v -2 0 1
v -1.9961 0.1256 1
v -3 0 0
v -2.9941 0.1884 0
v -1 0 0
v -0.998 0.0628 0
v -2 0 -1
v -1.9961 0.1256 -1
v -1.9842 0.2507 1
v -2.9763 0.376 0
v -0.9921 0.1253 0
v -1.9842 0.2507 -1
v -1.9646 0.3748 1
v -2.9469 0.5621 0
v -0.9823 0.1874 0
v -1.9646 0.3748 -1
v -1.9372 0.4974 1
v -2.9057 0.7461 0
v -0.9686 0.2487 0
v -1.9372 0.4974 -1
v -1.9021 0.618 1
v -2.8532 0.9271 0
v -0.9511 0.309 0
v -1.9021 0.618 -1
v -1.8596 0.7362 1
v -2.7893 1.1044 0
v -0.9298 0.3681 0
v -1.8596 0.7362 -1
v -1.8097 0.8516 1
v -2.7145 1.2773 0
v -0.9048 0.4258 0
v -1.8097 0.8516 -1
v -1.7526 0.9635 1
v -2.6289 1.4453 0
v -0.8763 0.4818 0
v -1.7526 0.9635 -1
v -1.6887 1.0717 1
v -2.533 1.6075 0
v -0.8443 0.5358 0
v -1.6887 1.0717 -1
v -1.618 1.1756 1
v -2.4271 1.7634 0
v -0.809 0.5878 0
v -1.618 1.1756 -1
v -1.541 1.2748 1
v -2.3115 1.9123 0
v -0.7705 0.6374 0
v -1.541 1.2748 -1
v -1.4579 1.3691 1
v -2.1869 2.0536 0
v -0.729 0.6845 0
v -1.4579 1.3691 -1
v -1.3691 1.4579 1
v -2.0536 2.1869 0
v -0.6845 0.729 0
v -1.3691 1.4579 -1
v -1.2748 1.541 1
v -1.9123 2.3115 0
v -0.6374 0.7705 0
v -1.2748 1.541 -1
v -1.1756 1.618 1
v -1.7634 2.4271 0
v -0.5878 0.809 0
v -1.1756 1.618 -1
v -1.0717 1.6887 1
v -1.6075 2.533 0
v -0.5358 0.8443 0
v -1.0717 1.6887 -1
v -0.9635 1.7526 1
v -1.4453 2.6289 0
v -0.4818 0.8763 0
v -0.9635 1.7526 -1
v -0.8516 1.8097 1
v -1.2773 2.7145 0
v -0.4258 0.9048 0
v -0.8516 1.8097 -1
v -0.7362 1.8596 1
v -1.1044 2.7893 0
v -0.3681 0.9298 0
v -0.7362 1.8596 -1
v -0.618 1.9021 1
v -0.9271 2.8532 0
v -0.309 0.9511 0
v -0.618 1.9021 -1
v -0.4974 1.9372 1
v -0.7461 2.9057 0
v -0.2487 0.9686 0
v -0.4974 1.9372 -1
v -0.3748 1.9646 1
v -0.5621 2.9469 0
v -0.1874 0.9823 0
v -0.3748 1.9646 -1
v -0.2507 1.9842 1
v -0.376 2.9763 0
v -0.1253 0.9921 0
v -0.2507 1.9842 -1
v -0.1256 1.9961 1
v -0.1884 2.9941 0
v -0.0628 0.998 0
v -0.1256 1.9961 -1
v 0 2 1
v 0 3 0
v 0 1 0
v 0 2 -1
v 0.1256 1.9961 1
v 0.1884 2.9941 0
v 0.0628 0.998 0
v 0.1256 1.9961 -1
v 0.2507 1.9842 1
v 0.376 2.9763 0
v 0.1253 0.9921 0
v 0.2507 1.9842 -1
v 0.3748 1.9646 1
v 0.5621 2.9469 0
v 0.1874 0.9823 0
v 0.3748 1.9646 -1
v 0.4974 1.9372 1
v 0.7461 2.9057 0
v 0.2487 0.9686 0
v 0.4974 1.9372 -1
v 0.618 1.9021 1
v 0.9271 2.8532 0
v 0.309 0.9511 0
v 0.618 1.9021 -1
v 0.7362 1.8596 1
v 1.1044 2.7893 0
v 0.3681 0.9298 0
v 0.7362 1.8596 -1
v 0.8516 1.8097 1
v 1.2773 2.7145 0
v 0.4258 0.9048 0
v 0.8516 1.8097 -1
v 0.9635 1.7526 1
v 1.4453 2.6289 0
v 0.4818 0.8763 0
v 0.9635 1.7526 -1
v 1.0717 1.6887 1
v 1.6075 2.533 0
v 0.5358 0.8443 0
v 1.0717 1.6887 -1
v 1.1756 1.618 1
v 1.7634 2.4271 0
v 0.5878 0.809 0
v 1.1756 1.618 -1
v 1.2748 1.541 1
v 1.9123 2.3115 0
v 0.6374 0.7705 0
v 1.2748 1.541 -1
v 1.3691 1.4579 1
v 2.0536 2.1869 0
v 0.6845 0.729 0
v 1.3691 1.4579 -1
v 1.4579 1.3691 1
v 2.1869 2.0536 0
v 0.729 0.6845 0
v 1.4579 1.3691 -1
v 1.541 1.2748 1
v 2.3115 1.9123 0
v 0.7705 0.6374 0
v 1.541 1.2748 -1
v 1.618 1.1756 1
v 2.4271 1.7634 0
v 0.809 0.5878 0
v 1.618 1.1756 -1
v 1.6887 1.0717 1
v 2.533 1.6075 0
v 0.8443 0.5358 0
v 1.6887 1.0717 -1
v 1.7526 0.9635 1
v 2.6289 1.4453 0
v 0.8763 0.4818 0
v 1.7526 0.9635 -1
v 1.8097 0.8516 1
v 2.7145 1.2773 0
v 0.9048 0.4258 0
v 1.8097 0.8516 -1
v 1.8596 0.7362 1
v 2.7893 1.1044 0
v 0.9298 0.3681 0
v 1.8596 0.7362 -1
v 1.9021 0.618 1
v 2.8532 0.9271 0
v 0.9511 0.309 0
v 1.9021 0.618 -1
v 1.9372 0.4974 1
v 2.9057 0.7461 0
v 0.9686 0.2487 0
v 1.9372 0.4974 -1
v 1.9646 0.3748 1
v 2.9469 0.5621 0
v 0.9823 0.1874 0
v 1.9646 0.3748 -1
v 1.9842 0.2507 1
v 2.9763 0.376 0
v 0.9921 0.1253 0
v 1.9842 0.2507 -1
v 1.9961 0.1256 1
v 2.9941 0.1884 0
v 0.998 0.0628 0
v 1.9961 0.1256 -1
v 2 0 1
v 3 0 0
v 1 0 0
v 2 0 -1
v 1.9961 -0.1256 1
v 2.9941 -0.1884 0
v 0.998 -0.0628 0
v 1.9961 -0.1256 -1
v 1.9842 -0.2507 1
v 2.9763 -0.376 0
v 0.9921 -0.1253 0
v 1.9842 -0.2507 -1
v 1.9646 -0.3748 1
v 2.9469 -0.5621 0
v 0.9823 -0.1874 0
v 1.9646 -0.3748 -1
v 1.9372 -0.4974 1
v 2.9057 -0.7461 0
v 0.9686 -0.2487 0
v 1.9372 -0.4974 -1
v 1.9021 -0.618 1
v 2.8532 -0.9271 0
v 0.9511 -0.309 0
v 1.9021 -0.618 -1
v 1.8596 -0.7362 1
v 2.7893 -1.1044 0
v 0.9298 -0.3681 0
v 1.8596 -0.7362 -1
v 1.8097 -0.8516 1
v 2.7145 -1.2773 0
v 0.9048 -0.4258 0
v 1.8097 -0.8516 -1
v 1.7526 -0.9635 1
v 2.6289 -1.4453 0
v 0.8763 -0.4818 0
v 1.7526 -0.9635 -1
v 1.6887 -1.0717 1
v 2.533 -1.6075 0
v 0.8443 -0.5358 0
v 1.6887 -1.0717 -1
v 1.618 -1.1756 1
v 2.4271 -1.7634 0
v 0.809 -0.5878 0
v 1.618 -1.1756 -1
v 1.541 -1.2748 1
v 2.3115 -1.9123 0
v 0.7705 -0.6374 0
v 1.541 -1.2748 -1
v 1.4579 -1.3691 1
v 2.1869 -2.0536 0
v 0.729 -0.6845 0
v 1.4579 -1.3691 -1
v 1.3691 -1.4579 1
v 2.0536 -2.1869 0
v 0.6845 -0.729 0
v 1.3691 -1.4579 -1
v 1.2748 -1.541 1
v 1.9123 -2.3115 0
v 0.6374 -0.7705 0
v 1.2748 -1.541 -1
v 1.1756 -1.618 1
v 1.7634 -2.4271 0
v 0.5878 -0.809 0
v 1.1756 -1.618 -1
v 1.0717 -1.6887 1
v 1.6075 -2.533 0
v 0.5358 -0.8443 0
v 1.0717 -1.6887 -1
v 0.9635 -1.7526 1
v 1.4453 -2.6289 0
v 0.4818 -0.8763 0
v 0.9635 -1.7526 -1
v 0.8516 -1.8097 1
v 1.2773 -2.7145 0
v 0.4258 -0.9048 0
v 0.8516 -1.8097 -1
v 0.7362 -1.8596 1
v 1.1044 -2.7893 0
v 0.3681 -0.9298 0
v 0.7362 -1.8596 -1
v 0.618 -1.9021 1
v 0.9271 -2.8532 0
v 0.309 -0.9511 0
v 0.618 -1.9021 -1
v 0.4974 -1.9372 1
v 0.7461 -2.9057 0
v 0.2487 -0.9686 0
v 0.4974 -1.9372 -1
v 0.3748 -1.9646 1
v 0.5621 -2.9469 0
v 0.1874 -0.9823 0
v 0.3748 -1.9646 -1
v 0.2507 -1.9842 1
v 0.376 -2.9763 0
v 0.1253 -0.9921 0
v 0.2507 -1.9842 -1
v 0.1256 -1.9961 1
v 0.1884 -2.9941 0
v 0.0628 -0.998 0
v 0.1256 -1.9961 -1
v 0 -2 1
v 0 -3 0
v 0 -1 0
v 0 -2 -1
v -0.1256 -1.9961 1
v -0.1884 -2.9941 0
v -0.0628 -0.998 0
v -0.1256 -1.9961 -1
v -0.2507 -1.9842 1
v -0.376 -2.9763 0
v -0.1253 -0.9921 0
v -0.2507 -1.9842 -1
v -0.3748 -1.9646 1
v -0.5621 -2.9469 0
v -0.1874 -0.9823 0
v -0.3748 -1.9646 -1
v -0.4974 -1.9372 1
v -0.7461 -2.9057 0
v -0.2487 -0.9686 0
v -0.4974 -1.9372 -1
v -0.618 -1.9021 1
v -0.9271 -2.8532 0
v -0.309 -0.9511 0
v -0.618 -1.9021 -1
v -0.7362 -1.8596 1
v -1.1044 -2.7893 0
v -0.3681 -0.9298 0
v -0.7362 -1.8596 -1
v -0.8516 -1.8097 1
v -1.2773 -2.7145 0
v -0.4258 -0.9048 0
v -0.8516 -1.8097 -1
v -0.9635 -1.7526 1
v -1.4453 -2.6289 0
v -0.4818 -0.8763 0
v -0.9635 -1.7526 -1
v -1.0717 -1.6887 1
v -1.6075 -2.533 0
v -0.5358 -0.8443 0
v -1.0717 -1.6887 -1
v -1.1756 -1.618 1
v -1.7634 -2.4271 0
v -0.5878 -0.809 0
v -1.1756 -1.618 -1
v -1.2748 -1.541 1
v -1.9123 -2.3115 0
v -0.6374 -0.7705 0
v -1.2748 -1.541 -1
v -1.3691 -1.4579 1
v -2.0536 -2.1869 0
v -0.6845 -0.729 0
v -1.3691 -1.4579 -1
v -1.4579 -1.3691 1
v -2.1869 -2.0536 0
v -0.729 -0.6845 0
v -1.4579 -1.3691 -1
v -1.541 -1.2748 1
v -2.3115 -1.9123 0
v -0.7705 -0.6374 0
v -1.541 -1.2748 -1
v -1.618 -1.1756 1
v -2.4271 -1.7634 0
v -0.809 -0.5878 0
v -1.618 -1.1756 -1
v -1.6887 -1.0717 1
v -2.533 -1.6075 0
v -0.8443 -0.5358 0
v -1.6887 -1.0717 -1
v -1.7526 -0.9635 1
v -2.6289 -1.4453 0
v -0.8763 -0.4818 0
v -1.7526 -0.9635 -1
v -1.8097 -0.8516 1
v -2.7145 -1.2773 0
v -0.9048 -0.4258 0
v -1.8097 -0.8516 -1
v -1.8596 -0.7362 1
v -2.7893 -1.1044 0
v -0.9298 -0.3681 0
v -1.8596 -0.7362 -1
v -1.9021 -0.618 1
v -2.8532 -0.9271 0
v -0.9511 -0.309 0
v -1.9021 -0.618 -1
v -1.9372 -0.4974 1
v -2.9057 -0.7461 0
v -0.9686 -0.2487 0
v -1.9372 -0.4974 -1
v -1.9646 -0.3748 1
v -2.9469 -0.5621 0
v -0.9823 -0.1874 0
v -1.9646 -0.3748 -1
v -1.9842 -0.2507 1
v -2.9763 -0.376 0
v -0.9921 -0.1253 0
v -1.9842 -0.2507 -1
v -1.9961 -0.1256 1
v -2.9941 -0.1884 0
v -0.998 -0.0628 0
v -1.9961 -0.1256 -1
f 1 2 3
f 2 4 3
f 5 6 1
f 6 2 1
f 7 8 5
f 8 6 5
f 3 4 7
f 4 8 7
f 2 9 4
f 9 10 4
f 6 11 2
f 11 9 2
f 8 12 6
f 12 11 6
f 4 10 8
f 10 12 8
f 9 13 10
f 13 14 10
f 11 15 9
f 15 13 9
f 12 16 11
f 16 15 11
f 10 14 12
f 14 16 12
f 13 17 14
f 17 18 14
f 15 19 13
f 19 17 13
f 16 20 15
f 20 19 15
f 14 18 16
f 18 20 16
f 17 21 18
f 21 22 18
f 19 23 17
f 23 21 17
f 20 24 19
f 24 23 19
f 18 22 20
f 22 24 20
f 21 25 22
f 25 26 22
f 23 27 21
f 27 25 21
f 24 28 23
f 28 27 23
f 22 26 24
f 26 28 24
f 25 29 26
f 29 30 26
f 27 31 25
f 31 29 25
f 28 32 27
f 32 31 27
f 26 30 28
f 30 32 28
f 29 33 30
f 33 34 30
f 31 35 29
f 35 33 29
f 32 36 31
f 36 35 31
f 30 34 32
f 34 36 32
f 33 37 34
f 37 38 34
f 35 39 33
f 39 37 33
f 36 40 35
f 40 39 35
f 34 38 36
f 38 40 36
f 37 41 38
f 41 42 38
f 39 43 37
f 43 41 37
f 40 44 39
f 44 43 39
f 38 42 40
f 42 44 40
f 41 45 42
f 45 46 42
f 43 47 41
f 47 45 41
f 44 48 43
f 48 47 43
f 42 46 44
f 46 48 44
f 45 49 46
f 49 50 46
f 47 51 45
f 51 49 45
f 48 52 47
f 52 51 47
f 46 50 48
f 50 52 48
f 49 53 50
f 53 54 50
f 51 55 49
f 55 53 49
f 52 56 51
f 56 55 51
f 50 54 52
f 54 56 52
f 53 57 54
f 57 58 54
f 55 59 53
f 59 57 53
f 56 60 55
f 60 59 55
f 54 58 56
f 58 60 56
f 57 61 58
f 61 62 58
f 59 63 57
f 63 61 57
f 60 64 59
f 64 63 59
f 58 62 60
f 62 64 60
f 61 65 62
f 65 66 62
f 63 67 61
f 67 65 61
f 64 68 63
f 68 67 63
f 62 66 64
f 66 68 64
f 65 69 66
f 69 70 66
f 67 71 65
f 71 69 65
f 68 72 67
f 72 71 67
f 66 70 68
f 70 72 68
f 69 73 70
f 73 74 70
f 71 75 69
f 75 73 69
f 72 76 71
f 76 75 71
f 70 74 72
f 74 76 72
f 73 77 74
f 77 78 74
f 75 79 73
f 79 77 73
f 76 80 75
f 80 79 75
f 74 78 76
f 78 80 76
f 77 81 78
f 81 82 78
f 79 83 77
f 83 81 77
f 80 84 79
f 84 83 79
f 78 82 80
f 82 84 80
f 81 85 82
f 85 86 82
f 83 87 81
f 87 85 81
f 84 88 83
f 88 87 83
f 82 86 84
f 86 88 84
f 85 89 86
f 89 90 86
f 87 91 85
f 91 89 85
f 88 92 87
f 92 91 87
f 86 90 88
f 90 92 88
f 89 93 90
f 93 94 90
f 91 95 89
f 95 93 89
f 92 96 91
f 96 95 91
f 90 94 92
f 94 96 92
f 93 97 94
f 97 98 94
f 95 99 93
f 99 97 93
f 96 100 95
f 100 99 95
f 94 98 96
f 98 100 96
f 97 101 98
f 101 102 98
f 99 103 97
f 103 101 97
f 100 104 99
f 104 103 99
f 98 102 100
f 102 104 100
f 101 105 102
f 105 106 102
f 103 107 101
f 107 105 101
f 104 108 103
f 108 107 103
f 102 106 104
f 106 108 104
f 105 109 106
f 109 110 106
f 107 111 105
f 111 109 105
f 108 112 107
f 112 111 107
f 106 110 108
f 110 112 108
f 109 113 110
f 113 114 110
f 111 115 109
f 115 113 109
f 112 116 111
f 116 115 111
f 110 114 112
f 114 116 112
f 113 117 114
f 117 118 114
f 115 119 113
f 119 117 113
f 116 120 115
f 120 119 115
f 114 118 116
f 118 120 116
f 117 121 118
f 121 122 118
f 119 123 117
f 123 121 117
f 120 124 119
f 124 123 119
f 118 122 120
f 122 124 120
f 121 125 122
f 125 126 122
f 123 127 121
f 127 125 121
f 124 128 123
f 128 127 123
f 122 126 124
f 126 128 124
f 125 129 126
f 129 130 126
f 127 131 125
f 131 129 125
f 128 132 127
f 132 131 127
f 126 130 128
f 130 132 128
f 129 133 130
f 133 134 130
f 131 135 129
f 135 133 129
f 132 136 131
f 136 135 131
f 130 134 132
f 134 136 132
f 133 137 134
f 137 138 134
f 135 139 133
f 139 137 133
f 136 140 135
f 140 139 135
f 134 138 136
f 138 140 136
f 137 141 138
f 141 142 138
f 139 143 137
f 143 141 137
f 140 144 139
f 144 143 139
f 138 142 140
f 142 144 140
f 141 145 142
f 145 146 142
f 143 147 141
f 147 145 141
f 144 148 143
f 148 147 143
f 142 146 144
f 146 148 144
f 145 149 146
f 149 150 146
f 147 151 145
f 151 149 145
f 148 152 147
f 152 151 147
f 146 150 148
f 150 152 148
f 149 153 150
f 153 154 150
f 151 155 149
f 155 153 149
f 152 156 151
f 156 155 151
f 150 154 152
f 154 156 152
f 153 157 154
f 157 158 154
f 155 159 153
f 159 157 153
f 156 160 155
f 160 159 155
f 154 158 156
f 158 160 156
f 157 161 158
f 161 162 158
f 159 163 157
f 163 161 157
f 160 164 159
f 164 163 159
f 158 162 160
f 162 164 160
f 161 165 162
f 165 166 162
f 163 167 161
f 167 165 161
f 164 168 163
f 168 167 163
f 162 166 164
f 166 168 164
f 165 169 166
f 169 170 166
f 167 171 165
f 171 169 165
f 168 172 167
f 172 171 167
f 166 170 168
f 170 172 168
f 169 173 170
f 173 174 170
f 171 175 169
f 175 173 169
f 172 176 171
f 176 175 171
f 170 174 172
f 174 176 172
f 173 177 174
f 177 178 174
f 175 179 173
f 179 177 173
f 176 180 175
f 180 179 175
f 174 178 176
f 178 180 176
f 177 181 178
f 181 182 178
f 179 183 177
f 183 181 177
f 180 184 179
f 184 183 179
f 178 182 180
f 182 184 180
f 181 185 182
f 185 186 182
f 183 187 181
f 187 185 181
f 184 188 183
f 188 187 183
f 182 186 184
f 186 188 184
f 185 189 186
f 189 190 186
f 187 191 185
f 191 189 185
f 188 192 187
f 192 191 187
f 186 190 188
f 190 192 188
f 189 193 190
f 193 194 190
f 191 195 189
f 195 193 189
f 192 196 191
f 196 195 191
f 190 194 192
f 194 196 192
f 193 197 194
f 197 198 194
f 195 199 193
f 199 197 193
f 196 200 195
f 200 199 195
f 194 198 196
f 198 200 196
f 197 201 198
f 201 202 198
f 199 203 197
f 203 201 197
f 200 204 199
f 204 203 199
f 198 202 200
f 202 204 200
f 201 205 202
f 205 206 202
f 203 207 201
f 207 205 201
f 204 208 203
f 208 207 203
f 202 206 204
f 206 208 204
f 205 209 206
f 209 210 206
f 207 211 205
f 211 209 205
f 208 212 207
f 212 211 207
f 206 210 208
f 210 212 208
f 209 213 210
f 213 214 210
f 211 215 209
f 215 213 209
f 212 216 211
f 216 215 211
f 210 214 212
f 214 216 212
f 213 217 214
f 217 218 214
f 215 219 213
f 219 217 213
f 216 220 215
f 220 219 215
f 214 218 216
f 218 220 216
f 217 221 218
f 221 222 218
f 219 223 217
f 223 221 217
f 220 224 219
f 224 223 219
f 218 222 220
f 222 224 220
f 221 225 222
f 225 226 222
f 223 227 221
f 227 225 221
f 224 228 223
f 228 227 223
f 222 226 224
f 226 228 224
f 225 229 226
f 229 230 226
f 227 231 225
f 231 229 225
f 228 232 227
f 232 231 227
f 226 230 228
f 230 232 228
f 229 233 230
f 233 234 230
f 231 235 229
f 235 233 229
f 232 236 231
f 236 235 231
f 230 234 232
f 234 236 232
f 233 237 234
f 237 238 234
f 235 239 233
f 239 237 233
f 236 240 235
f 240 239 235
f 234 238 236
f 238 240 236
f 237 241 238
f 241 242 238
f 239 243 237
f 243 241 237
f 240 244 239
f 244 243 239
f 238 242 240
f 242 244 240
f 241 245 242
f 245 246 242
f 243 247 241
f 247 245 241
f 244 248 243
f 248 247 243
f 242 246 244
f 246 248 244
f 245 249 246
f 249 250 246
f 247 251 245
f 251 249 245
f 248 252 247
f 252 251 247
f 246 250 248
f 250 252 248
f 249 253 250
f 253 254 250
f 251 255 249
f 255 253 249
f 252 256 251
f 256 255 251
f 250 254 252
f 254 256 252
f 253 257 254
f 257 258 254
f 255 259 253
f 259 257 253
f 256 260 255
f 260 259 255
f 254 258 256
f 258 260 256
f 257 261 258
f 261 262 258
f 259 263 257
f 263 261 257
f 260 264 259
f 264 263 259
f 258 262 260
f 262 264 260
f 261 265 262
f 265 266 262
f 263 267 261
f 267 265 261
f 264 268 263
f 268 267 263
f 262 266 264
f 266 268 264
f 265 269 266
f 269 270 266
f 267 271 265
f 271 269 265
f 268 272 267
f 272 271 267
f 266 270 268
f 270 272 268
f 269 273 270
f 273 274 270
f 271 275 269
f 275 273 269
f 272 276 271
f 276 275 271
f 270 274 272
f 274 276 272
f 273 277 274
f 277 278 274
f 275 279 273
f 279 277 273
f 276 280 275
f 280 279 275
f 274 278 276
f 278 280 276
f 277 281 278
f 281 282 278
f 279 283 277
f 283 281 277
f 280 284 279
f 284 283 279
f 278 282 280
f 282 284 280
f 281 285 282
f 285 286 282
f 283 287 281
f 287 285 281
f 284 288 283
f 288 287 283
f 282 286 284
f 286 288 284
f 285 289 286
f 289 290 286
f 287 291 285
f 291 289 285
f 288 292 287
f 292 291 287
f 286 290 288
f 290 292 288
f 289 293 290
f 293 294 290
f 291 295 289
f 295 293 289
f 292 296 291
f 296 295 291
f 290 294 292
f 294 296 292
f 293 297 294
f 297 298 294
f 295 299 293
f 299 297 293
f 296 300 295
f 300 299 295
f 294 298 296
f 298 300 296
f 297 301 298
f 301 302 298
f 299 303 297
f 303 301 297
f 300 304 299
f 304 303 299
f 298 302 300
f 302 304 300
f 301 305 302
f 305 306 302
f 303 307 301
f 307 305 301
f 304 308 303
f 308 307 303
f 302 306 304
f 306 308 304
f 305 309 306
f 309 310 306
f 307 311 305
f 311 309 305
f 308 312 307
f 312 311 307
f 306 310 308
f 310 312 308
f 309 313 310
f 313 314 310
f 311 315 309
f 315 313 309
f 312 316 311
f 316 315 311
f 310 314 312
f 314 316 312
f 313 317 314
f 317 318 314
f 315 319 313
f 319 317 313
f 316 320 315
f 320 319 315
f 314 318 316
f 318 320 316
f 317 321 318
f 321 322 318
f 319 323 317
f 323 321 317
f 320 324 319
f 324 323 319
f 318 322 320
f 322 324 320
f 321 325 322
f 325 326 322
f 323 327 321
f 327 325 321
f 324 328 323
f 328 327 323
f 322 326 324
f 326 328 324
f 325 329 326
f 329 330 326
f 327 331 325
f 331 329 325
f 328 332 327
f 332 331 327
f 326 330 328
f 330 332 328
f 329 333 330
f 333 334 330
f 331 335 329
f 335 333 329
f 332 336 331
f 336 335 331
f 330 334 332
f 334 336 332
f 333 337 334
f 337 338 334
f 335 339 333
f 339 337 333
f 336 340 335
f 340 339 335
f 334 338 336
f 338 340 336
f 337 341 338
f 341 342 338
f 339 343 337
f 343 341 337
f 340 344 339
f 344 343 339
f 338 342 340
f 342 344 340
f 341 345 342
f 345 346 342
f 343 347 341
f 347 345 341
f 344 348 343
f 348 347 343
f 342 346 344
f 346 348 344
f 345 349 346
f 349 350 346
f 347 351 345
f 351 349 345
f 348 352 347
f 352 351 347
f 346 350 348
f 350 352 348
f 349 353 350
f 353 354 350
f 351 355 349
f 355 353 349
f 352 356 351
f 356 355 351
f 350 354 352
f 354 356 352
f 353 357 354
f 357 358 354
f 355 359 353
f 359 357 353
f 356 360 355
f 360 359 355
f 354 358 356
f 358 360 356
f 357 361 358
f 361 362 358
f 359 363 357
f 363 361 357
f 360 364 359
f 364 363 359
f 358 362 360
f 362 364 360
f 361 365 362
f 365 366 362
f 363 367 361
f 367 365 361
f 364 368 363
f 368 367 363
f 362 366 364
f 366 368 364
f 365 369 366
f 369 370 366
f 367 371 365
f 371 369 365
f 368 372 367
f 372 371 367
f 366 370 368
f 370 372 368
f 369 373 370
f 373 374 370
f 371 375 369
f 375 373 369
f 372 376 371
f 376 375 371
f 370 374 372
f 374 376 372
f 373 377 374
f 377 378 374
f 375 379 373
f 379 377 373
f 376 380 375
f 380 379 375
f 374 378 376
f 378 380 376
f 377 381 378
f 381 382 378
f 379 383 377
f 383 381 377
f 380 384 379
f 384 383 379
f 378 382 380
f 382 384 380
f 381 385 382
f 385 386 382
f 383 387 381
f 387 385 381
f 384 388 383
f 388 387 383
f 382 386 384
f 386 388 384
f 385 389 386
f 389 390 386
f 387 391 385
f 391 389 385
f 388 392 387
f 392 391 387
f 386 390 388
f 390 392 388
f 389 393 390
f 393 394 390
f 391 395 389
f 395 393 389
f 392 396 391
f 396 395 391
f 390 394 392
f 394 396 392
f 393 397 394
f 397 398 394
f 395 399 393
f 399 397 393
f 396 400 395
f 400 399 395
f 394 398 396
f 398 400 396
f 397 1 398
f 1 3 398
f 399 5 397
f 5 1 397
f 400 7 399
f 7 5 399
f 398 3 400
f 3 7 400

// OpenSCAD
rotate_extrude($fn = 100, angle = 360) {
	translate(v = [2, 0, 0]) {
		polygon(paths = [[0, 1, 2, 3, 4]], points = [[1.0, 0.0], [6.123233995736766e-17, 1.0], [-1.0, 1.2246467991473532e-16], [-1.8369701987210297e-16, -1.0], [1.0, -2.4492935982947064e-16]]);
	}
}
